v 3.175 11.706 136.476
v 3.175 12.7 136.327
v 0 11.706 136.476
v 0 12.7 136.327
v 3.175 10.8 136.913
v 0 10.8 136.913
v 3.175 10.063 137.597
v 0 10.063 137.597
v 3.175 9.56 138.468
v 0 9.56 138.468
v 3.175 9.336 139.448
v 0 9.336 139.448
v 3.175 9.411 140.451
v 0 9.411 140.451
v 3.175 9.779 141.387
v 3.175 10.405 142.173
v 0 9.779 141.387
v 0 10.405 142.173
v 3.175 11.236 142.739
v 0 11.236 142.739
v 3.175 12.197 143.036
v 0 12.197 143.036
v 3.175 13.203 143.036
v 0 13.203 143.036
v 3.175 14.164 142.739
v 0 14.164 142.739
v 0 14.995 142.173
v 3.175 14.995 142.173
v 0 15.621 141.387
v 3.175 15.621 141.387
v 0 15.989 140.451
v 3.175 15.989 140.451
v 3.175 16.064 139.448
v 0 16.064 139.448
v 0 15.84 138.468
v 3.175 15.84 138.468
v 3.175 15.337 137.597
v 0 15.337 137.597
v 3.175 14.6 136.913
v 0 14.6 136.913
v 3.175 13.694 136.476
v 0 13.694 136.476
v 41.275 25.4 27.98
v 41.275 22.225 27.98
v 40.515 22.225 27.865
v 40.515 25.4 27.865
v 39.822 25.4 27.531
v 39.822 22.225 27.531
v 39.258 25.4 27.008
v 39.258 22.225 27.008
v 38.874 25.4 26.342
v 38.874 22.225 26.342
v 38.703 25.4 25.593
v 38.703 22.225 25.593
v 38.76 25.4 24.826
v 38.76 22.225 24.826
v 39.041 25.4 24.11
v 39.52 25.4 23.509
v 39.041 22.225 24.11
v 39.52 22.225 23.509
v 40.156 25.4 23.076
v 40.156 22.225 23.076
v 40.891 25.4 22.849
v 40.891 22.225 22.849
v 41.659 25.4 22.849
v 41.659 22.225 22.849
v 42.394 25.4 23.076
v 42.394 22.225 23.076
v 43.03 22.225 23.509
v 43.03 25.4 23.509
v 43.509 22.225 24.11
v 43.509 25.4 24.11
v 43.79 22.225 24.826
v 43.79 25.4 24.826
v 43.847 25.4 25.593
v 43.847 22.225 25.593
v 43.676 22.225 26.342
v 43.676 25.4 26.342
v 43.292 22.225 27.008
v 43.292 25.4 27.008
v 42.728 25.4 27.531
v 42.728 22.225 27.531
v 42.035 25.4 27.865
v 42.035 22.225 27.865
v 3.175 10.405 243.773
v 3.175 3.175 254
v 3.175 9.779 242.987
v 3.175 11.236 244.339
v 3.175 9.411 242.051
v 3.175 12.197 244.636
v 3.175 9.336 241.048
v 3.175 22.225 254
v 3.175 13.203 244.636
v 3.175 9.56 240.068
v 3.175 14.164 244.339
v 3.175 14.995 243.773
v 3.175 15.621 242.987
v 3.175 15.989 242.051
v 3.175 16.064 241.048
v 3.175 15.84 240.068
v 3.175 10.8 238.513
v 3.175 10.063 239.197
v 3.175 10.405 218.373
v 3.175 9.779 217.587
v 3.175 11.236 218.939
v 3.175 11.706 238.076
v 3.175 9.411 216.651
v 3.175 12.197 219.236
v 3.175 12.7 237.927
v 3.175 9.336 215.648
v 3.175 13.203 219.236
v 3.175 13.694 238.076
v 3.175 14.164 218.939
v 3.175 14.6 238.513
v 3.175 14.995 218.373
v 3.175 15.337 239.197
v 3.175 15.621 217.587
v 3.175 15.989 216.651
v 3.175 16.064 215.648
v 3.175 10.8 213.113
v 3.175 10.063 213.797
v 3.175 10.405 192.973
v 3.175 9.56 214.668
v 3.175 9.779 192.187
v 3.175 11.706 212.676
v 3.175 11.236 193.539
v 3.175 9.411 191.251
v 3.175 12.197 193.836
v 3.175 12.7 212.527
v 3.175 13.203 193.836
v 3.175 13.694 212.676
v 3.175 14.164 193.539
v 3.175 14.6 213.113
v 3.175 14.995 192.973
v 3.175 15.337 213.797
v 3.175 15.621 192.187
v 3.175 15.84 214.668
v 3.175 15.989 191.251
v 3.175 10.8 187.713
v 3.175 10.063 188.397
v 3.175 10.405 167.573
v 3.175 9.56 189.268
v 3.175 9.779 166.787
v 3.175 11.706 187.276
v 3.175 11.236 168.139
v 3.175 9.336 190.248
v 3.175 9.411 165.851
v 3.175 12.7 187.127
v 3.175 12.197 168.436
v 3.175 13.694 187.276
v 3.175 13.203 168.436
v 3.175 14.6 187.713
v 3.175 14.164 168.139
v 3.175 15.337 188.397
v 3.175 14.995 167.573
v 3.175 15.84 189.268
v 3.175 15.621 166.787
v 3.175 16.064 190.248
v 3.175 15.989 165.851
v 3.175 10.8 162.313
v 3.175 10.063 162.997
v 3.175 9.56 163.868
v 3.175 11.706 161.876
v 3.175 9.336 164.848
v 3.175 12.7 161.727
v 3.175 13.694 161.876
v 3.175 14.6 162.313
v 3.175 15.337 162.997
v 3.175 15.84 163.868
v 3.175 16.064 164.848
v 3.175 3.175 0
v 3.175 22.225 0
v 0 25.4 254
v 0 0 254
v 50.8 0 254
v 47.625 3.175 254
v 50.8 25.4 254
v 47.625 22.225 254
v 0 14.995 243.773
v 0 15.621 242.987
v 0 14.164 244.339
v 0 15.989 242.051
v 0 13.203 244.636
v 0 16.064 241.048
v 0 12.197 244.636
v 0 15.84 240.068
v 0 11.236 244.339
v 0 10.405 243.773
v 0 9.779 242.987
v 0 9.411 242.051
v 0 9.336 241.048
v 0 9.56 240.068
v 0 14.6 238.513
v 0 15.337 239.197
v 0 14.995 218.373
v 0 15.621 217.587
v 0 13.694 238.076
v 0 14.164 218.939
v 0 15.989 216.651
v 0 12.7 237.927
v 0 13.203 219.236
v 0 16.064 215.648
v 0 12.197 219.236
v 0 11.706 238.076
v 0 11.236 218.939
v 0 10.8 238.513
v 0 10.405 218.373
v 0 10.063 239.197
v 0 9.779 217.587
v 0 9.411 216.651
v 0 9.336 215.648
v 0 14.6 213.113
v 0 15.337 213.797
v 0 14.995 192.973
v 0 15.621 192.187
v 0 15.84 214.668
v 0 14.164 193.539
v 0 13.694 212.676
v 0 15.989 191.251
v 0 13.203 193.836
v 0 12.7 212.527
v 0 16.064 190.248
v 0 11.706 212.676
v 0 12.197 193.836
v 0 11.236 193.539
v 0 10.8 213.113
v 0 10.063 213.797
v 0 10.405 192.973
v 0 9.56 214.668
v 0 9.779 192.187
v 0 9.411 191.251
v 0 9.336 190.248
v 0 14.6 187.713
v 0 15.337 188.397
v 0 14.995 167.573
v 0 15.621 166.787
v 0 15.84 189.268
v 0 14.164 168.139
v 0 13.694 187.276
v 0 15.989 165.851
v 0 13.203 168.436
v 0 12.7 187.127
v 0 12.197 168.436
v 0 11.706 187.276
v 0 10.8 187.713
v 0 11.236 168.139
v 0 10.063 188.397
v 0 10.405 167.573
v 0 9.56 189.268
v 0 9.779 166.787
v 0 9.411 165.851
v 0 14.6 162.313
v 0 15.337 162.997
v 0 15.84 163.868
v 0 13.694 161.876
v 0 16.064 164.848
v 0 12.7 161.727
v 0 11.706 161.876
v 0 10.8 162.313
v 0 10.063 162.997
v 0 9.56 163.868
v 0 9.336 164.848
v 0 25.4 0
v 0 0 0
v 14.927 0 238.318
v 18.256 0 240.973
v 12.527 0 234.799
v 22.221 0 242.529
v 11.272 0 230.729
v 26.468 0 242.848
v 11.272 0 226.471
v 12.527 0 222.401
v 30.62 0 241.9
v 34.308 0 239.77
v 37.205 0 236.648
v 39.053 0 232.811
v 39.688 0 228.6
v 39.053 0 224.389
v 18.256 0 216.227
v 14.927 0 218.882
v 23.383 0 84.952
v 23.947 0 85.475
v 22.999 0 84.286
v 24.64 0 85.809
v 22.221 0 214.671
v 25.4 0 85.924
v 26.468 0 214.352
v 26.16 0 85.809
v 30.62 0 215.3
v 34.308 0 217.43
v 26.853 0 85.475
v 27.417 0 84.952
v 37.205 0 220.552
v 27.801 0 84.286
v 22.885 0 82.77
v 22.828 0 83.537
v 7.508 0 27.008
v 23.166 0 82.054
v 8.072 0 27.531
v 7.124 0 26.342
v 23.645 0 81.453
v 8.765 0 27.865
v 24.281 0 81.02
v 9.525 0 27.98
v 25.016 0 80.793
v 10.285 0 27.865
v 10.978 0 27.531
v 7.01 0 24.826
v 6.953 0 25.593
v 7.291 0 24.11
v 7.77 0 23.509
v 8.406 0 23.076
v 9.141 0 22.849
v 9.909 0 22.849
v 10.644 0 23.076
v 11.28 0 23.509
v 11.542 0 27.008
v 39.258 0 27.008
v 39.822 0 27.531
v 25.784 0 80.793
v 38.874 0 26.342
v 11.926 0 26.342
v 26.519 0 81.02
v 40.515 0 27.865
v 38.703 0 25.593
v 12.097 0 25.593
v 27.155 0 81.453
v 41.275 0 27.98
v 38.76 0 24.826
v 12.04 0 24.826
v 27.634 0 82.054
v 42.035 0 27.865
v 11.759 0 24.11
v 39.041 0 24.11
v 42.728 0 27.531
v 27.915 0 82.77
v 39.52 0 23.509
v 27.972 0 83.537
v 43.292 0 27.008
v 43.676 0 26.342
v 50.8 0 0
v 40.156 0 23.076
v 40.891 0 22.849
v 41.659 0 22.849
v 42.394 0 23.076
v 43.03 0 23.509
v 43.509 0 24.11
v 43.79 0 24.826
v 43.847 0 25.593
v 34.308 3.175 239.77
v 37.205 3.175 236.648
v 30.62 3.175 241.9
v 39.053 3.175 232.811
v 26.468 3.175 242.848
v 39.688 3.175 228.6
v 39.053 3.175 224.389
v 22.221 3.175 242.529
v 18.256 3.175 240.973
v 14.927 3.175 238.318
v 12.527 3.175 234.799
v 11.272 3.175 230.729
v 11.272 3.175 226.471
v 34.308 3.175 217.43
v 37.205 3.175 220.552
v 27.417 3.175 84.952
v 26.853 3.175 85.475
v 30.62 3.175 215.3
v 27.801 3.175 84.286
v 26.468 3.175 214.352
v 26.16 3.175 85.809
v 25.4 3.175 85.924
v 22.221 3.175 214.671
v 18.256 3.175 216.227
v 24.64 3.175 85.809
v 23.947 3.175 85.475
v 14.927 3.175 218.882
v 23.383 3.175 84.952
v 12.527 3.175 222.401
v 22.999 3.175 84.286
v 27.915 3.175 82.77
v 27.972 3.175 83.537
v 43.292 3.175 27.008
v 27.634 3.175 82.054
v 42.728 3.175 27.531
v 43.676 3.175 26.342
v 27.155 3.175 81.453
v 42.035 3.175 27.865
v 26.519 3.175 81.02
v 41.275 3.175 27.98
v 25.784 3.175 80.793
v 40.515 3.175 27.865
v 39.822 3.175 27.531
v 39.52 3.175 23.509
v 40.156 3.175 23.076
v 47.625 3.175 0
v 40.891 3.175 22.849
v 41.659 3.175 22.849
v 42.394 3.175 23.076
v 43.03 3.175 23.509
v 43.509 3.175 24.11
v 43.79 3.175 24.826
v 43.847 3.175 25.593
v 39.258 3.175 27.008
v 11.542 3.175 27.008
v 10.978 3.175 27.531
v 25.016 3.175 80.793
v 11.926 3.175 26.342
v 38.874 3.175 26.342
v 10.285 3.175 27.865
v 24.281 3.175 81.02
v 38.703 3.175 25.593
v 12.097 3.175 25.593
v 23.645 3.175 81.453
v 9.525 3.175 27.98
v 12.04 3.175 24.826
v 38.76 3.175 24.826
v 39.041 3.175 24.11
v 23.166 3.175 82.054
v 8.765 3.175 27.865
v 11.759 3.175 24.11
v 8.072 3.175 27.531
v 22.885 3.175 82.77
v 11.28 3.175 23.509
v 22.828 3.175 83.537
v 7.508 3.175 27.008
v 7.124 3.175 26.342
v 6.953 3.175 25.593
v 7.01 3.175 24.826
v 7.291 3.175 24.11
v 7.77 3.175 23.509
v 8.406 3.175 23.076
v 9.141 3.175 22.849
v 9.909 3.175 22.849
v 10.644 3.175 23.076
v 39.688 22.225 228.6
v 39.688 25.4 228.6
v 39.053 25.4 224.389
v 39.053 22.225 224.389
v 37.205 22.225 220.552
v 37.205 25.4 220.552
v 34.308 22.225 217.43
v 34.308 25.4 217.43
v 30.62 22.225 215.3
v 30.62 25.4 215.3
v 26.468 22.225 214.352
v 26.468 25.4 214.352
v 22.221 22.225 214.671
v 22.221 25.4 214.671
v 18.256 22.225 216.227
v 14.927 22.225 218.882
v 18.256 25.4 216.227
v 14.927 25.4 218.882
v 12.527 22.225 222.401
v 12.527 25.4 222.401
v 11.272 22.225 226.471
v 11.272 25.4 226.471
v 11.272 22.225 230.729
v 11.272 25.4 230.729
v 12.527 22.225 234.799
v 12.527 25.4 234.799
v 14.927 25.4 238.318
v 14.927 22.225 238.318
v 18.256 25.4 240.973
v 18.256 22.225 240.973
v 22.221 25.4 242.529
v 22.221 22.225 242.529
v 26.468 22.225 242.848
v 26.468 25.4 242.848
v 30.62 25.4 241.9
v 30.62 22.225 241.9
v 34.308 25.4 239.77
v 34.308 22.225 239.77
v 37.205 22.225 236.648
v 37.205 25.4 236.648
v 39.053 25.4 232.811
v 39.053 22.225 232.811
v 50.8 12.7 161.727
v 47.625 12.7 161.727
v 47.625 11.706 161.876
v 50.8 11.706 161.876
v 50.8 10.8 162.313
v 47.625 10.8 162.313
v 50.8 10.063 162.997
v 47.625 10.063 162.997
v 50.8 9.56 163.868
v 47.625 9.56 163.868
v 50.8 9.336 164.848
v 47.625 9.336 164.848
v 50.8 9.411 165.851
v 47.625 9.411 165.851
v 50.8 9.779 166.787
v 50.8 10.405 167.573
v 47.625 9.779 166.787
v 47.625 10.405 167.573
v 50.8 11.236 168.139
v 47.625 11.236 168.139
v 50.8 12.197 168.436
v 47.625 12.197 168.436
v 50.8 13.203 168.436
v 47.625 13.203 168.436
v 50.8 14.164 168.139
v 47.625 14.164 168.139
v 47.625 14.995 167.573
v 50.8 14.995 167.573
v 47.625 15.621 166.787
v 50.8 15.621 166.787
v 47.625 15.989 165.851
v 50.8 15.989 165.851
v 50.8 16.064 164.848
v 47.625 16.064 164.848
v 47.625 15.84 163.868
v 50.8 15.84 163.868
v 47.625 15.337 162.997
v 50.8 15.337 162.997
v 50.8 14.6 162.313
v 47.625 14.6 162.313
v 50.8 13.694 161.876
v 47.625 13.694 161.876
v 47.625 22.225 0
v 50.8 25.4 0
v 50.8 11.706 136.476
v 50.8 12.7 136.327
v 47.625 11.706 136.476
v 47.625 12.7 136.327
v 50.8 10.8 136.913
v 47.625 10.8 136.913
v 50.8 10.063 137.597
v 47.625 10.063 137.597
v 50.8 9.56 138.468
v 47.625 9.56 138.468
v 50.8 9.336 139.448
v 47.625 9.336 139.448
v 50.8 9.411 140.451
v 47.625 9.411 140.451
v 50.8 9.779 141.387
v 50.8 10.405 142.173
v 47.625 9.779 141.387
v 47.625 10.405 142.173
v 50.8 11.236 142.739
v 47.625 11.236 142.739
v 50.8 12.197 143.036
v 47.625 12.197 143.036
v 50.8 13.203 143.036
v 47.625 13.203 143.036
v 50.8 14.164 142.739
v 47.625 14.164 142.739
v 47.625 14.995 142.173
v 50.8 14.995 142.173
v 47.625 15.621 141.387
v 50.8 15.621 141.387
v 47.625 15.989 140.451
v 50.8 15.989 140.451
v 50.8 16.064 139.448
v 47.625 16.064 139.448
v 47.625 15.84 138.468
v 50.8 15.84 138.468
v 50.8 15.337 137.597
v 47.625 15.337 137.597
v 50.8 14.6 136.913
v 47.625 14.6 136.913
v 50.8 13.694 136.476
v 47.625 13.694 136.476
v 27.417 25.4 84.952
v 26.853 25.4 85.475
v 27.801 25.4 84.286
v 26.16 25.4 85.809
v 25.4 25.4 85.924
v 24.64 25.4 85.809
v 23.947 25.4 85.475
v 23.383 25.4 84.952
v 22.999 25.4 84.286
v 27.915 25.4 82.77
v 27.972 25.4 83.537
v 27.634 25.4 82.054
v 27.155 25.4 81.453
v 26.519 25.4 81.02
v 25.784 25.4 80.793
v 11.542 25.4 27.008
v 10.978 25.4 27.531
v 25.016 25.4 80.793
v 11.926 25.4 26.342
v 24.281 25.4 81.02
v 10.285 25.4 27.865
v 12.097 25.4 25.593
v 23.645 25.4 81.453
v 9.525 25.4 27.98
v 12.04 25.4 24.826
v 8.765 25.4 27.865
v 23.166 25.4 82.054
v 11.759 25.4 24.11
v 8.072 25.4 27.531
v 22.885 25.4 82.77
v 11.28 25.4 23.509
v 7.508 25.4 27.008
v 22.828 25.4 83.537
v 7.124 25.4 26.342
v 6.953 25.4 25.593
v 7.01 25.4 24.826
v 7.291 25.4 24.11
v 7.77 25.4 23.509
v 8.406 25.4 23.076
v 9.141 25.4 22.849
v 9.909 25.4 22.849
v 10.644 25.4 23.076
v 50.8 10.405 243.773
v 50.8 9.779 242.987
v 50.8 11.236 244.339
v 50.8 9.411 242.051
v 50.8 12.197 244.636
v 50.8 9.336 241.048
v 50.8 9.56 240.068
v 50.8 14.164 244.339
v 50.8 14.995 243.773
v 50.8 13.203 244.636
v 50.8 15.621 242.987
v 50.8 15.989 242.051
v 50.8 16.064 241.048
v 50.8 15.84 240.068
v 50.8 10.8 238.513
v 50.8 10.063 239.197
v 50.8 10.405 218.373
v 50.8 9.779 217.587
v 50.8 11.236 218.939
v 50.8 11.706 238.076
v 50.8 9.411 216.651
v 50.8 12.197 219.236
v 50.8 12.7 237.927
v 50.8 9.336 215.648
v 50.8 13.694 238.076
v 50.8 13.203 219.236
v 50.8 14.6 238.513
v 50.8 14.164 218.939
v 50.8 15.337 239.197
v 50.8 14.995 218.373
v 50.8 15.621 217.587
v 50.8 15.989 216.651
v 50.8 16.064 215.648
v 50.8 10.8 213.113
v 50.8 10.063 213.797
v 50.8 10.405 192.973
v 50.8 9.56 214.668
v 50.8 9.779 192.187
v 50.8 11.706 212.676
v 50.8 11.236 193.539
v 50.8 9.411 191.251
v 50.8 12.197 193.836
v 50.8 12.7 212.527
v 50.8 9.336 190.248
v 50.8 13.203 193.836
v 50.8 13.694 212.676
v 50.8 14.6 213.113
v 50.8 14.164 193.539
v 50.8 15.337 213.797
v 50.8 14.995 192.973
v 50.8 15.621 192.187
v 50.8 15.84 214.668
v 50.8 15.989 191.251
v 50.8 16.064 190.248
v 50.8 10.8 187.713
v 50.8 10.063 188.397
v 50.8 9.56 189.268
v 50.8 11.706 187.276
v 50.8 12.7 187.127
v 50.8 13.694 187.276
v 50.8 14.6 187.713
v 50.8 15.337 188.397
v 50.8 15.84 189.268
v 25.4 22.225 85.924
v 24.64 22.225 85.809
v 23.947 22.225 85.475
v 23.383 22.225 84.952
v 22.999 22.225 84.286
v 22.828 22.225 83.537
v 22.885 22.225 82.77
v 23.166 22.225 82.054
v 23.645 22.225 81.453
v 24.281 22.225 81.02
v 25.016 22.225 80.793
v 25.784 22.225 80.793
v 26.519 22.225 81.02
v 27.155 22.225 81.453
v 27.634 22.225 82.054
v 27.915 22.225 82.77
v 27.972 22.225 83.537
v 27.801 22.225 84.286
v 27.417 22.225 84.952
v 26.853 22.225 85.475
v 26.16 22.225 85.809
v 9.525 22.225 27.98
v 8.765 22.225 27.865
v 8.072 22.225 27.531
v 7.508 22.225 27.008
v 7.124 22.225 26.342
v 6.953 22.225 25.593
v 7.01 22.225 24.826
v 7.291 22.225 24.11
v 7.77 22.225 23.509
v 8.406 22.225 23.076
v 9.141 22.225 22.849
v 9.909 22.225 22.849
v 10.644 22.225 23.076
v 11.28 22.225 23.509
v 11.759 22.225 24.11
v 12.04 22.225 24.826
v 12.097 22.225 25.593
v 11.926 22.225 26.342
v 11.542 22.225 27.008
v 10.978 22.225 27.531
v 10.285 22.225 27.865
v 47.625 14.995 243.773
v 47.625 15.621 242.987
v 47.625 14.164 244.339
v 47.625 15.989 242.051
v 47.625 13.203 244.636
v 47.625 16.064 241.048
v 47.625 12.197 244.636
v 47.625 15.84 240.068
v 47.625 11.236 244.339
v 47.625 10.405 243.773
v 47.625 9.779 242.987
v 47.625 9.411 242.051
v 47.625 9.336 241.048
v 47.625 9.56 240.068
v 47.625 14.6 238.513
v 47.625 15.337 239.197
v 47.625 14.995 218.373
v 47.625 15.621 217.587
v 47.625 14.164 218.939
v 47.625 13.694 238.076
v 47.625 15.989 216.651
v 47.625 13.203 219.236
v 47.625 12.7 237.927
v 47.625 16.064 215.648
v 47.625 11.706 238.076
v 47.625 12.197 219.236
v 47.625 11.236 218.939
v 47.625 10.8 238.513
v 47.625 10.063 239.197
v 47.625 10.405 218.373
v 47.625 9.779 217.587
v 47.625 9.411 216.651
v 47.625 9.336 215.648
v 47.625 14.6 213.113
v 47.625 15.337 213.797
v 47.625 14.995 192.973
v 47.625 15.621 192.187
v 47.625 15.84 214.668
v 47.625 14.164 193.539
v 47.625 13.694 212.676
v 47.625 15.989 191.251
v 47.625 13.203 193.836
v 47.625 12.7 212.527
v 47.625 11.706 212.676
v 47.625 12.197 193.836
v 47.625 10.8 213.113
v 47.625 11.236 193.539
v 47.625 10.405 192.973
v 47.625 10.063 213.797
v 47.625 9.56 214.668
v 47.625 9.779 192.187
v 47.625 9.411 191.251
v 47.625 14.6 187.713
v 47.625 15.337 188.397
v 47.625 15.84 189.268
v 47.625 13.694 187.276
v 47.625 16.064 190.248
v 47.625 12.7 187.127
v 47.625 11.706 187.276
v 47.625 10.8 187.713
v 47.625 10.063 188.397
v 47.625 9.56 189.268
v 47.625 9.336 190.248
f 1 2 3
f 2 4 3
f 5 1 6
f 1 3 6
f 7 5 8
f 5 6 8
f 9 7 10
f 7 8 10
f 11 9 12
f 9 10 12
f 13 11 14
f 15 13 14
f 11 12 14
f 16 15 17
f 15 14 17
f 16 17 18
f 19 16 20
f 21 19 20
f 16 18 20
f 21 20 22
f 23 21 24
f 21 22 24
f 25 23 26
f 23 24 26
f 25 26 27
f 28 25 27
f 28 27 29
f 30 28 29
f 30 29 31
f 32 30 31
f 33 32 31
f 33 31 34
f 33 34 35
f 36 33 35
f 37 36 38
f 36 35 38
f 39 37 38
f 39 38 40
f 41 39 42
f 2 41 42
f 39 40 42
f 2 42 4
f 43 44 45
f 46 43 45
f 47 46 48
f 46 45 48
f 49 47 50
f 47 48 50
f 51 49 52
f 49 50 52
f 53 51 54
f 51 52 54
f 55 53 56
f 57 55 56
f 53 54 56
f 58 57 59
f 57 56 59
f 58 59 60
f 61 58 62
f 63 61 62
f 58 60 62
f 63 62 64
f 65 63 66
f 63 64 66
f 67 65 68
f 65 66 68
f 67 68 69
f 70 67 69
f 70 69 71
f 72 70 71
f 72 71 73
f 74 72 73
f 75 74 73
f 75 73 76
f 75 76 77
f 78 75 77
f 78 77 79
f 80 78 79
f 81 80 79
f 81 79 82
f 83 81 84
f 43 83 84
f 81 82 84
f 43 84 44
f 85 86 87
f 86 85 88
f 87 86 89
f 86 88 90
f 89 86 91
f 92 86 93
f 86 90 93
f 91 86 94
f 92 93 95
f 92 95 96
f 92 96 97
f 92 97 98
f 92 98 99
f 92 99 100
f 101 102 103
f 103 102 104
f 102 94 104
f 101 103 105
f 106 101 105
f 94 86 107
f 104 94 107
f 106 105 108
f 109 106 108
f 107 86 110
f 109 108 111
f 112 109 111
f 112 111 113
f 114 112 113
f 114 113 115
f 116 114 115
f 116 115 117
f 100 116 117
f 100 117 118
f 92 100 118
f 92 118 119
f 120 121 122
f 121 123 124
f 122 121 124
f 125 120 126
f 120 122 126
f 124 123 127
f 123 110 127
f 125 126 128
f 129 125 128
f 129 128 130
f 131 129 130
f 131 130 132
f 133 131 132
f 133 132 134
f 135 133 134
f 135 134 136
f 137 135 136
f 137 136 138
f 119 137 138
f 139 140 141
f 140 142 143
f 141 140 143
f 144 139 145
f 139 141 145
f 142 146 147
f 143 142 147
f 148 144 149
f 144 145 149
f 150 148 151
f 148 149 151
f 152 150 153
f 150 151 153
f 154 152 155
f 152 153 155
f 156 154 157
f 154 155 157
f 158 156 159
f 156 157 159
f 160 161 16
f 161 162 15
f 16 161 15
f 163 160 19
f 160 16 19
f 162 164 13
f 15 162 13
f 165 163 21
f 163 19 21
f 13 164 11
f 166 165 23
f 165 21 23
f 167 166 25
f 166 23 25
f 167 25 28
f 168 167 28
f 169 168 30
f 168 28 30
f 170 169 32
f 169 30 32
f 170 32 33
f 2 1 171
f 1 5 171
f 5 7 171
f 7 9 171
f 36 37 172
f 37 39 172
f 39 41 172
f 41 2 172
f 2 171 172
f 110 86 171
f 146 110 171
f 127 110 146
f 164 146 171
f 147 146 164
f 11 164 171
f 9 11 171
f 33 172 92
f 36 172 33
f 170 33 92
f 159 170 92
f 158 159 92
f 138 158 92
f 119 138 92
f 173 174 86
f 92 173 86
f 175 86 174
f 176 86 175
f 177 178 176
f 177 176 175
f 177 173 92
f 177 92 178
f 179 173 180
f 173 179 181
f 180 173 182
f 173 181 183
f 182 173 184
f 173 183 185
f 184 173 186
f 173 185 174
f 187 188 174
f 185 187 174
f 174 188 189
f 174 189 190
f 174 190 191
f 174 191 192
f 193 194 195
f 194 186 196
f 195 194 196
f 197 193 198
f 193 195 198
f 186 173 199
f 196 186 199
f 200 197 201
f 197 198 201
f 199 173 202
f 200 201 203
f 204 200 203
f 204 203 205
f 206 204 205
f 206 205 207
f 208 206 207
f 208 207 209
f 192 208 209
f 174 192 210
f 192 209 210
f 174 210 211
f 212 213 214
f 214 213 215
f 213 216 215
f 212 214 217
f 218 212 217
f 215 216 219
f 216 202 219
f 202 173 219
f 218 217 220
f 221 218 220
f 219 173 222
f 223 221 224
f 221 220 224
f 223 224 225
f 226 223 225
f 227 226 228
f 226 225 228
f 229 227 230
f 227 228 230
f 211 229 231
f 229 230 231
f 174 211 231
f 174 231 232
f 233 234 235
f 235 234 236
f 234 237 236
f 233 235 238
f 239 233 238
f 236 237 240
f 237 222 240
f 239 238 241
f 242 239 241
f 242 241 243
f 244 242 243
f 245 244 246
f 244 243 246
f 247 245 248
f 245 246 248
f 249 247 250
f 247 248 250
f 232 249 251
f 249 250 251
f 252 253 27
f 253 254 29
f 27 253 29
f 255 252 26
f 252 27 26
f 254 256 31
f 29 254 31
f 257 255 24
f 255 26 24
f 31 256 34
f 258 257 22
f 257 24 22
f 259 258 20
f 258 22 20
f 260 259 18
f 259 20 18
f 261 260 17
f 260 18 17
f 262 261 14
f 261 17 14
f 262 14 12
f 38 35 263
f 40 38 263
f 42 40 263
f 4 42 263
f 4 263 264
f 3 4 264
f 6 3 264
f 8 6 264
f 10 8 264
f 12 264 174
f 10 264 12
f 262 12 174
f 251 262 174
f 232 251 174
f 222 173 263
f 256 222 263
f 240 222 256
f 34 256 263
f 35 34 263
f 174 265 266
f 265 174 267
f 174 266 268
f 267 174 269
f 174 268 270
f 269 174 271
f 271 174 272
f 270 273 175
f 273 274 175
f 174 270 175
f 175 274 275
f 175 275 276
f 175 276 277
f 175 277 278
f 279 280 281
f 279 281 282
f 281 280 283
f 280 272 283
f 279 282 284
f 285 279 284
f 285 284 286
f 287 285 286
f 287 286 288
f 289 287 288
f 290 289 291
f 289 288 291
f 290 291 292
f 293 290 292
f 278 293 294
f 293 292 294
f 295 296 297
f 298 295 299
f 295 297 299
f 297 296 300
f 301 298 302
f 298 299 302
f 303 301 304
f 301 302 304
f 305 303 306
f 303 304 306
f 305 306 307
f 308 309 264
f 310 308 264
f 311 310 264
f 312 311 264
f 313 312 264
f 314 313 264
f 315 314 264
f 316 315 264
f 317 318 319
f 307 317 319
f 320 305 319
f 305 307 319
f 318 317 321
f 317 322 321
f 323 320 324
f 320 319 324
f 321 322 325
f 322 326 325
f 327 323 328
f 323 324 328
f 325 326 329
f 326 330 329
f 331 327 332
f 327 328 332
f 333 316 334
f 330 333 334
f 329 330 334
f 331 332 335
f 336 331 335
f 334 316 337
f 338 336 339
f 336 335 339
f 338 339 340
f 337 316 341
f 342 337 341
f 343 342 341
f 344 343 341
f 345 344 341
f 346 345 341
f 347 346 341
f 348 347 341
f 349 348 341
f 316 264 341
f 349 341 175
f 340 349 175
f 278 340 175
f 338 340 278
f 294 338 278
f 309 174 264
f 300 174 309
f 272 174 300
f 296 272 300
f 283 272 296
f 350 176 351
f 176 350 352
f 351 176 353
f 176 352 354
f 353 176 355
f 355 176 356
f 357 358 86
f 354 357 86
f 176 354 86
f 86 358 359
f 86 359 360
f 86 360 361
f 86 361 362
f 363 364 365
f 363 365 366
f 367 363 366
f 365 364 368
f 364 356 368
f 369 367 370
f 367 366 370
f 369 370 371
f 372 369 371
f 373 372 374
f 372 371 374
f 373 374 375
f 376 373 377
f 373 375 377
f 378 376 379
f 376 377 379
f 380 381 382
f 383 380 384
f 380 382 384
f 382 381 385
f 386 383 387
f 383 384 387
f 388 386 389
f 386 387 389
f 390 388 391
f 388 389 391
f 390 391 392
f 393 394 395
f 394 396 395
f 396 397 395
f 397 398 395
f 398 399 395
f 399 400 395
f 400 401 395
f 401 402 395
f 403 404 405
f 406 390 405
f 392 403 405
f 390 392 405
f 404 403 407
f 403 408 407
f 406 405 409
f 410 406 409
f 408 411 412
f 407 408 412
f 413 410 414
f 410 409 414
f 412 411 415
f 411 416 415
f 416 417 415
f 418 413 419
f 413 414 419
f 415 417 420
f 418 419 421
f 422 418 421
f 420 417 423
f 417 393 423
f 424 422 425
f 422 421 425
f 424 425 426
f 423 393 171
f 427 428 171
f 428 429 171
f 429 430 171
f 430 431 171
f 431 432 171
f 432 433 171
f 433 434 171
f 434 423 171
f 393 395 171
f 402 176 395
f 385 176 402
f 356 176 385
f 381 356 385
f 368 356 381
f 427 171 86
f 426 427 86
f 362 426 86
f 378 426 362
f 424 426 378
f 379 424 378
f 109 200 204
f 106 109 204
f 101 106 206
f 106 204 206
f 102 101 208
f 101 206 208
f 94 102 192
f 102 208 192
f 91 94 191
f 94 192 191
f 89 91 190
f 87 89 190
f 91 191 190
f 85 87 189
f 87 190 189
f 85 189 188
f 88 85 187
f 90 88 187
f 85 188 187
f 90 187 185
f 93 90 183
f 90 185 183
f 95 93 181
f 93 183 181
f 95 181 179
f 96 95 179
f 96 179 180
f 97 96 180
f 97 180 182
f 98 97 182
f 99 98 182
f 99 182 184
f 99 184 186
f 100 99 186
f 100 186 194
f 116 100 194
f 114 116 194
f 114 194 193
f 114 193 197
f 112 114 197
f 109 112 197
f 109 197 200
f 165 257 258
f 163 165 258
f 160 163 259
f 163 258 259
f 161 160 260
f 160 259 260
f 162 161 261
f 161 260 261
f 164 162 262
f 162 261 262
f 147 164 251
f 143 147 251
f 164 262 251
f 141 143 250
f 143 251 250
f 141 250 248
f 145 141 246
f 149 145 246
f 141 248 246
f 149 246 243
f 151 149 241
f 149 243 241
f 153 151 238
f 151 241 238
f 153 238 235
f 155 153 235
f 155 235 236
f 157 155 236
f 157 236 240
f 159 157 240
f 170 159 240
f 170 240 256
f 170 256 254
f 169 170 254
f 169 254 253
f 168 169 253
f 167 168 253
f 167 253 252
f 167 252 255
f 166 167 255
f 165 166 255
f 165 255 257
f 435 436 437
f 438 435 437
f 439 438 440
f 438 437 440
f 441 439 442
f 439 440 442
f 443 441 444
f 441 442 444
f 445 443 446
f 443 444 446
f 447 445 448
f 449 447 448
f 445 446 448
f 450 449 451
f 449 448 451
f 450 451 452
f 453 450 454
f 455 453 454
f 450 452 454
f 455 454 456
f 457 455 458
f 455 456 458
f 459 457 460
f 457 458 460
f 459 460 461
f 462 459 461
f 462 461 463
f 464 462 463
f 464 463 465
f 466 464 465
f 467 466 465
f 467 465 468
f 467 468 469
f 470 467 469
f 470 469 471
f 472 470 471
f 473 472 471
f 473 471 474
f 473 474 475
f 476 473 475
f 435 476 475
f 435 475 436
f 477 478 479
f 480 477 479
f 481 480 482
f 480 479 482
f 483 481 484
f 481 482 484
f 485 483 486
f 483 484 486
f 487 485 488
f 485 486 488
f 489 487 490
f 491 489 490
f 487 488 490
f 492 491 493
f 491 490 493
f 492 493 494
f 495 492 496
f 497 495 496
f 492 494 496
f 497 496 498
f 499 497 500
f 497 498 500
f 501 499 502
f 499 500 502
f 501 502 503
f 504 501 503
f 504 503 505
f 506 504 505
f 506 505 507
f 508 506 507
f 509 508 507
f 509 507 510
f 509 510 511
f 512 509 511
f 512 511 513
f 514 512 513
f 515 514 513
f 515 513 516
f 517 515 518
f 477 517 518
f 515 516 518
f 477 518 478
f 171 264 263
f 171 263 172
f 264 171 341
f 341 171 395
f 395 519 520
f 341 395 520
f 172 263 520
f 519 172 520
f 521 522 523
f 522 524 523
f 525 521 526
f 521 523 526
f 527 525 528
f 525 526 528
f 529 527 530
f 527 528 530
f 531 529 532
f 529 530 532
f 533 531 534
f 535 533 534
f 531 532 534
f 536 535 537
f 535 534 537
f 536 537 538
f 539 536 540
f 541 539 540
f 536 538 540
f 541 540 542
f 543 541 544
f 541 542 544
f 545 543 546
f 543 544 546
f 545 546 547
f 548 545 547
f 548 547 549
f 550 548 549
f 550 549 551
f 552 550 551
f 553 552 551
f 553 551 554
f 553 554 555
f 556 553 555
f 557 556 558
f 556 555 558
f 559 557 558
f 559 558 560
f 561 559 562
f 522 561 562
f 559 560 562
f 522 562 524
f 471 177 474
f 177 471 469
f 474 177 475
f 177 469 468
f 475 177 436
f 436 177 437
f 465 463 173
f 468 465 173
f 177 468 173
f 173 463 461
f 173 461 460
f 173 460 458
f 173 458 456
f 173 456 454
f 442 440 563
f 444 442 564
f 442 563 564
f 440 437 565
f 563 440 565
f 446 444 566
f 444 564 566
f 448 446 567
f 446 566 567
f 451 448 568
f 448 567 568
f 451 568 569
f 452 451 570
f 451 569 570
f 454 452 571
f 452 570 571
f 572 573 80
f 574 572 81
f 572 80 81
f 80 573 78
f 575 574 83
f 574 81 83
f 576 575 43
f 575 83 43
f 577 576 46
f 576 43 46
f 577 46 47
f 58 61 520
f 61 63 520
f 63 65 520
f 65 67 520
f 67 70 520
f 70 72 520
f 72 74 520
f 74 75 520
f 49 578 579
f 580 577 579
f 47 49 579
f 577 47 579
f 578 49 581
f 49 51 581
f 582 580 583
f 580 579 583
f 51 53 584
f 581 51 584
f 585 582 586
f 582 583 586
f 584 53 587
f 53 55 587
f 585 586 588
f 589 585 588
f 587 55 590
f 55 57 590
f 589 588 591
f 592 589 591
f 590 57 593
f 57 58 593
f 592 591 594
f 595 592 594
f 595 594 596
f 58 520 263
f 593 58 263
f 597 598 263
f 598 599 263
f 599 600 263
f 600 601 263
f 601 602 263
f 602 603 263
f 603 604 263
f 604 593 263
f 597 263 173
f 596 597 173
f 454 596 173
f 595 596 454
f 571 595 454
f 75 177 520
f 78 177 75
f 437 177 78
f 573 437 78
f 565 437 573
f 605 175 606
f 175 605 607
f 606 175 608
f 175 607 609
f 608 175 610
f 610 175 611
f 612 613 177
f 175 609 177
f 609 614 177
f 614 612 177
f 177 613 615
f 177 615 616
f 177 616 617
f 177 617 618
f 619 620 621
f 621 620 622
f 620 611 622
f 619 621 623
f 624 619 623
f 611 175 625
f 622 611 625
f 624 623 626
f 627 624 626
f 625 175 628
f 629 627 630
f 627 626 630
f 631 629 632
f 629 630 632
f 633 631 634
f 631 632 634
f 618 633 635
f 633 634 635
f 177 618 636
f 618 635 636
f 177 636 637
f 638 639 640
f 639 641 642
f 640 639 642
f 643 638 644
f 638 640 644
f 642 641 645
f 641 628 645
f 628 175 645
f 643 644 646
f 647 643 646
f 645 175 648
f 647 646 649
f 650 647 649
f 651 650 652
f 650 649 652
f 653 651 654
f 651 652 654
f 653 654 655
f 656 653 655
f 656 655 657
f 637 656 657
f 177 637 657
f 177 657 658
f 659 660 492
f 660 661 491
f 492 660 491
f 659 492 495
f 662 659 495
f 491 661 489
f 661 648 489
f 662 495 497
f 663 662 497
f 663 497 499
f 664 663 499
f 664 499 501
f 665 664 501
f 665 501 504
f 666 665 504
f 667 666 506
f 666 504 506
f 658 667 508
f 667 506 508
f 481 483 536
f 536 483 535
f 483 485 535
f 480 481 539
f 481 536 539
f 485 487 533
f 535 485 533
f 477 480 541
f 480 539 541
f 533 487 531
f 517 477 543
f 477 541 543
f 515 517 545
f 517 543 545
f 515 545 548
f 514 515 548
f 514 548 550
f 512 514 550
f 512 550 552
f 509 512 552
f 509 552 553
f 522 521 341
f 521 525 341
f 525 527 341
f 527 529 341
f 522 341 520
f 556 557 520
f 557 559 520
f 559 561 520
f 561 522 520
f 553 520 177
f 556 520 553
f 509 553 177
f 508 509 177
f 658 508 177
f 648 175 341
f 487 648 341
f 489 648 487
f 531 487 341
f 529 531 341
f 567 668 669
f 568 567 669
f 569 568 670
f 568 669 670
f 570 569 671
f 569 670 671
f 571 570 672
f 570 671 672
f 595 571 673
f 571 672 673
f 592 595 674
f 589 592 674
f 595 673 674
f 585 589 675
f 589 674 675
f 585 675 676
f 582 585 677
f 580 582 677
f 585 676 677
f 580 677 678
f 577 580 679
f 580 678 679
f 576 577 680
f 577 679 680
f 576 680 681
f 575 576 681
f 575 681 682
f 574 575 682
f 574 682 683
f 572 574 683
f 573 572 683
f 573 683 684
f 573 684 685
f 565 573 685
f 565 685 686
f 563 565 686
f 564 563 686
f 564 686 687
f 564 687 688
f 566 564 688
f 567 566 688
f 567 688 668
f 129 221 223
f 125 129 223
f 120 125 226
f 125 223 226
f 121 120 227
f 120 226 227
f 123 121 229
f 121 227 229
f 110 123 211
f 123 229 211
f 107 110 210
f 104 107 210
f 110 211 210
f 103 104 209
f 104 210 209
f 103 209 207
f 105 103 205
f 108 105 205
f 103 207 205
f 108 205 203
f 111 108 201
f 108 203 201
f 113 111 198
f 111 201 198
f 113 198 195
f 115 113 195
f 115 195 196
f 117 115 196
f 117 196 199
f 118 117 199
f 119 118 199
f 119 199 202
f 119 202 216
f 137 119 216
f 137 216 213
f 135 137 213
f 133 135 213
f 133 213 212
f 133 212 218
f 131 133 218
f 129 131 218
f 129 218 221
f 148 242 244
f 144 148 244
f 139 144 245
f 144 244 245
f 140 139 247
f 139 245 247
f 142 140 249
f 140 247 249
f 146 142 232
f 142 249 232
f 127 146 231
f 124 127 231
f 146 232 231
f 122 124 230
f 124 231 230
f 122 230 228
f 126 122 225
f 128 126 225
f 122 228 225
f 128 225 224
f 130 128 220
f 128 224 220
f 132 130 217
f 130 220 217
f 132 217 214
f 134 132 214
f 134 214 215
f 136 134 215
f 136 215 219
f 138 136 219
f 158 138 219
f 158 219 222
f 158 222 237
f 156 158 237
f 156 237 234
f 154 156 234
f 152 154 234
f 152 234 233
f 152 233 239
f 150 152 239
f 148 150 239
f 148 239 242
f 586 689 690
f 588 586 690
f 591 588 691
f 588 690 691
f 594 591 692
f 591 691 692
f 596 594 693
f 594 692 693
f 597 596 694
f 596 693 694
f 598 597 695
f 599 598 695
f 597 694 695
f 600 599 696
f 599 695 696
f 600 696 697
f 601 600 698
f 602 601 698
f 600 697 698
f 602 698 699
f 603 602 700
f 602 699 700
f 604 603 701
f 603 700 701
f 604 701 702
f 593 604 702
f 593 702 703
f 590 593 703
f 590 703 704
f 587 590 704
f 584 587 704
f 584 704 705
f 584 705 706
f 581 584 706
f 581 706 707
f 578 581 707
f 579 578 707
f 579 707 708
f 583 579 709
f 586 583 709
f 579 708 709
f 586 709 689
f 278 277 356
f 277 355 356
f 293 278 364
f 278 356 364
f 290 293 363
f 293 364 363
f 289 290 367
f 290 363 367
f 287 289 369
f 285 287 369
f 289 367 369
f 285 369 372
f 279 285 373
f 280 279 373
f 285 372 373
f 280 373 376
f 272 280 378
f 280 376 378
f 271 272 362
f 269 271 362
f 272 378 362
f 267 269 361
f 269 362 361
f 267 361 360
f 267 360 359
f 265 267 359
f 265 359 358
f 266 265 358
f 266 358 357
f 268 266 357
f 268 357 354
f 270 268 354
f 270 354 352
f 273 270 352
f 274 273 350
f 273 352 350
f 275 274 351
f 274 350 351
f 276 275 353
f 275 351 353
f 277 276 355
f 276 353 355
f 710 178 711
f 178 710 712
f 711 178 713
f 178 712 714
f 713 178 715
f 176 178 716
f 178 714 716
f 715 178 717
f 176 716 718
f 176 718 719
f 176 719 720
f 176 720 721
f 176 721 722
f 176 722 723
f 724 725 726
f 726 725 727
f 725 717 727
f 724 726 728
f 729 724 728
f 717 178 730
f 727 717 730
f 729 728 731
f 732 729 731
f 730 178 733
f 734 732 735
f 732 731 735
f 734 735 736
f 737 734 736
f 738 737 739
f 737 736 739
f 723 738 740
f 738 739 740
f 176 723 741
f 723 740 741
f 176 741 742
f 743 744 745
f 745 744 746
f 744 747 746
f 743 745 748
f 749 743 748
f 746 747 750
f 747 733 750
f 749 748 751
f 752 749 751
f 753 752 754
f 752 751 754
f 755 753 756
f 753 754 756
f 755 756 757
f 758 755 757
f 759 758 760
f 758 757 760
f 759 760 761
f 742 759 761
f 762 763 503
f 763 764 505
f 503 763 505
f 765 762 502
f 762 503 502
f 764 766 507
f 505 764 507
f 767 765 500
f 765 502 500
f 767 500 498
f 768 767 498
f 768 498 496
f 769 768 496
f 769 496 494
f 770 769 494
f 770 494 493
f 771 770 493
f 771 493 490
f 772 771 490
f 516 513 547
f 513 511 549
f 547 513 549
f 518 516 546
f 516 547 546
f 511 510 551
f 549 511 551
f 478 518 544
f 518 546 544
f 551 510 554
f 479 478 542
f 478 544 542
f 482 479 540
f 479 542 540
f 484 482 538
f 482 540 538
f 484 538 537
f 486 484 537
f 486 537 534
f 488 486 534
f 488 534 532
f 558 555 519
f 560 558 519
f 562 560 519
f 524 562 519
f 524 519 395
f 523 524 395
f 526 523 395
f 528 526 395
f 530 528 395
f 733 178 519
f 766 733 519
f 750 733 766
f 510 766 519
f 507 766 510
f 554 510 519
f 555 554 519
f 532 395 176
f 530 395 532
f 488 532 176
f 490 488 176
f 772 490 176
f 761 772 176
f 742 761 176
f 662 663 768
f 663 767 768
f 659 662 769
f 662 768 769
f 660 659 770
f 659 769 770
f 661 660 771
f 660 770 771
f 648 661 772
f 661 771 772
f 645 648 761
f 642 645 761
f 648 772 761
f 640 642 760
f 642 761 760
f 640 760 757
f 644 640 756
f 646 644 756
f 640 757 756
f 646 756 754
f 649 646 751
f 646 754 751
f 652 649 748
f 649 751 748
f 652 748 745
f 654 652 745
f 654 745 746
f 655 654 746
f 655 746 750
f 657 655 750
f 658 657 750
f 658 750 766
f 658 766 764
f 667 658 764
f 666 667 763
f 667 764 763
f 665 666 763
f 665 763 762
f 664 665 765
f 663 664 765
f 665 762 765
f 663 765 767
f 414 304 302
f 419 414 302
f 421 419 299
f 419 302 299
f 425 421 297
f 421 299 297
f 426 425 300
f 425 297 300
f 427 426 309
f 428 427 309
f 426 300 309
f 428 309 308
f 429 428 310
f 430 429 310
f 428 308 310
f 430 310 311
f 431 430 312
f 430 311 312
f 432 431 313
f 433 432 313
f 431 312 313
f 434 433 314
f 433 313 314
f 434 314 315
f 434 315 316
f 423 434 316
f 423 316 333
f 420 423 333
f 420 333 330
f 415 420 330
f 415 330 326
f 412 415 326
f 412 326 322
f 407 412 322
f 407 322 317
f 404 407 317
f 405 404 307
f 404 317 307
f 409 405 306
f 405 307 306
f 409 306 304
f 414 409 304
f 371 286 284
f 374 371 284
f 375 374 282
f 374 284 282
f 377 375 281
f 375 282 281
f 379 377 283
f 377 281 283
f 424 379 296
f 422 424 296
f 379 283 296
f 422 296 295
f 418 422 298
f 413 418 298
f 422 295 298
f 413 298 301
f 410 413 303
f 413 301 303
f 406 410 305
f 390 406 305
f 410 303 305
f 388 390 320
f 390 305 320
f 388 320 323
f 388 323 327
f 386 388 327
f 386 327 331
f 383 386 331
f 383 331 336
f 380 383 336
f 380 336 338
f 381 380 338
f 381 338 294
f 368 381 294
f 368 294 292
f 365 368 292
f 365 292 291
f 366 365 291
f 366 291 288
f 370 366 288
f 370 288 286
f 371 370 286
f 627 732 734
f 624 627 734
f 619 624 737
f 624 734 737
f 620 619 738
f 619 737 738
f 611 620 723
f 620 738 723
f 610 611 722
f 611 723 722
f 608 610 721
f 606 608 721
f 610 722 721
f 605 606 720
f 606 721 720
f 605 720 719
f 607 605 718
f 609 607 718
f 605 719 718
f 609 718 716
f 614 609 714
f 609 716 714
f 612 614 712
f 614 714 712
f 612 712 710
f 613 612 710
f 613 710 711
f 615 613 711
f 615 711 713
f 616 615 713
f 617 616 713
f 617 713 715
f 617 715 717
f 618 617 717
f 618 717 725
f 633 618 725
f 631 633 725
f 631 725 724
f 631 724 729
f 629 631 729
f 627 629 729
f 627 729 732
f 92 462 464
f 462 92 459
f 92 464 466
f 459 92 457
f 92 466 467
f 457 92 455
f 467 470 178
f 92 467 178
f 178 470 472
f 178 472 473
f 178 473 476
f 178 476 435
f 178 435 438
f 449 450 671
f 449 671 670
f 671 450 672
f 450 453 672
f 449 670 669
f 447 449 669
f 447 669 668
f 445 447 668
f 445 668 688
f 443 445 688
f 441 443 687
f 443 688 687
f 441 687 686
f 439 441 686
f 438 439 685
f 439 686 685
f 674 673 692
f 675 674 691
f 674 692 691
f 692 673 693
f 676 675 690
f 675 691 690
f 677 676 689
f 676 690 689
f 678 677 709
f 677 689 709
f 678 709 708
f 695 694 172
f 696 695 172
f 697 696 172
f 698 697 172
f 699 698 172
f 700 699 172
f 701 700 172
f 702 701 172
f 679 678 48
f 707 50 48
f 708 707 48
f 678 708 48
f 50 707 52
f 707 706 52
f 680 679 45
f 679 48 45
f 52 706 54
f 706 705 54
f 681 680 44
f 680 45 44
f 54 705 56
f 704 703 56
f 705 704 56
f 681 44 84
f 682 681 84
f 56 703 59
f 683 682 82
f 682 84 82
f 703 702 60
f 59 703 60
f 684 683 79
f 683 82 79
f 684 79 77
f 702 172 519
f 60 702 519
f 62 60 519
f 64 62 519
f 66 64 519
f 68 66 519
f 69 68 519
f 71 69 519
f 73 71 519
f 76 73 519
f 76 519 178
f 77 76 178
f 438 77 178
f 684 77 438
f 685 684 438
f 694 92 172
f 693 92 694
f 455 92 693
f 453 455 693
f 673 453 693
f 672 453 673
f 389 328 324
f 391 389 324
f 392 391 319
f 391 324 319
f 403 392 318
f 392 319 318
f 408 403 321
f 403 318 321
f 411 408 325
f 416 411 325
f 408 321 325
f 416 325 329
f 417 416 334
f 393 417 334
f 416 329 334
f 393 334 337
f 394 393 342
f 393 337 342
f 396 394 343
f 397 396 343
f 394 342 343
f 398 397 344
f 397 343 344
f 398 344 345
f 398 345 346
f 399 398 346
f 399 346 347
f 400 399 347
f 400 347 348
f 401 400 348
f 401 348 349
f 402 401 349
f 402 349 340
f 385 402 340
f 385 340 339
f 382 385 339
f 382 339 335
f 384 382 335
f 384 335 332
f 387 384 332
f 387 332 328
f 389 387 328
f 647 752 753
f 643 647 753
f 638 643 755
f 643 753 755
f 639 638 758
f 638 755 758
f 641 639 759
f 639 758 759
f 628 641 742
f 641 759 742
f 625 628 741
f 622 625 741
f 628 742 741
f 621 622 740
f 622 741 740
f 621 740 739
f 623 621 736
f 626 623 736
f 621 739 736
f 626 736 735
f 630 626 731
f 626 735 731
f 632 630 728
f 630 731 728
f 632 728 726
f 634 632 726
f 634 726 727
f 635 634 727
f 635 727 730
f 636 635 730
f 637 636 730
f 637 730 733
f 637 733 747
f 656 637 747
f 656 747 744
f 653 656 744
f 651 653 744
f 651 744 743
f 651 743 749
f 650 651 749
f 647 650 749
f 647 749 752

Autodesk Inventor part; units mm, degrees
ref_plane "YZ Plane" through (0, 0, 0) normal (1, 0, 0) x (0, 1, 0)
ref_plane "XZ Plane" through (0, 0, 0) normal (0, 1, 0) x (-1, 0, 0)
ref_plane "XY Plane" through (0, 0, 0) normal (0, 0, 1) x (1, 0, 0)
sketch "Sketch1" plane through (0, 0, 0) normal (0, 0, 1) x (1, 0, 0)
  line L0 (0, 0) -> (50.8, 0)
  line L1 (50.8, 0) -> (50.8, 25.4)
  line L2 (50.8, 25.4) -> (0, 25.4)
  line L3 (0, 25.4) -> (0, 0)
  line L4 (3.175, 22.225) -> (47.625, 22.225)
  line L5 (47.625, 22.225) -> (47.625, 3.175)
  line L6 (47.625, 3.175) -> (3.175, 3.175)
  line L7 (3.175, 3.175) -> (3.175, 22.225)
  dimension "d0" = 50.8
  dimension "d1" = 25.4
  dimension "d2" = 3.175
extrude "Extrusion1" add sketch "Sketch1" along normal blind 254
sketch "Sketch2" plane through (0, 0, 0) normal (0, -1, 0) x (1, 0, 0)
  circle A0 centre (25.4, 228.6) radius 4.7625
  line L0 (47.625, 254) -> (3.175, 254) projected
  line L1 (0, 0) -> (0, 254) projected
  dimension "d5" = 9.525
  dimension "d6" = 25.4
  dimension "d7" = 25.4
extrude "Extrusion2" cut sketch "Sketch2" against normal blind 25.4
sketch "Sketch3" plane through (0, 25.4, 0) normal (0, 1, 0) x (1, 0, 0)
  circle A0 centre (25.4, -228.6) radius 4.7625 projected
  circle A1 centre (25.4, -228.6) radius 14.2875
  point P0 (0, 0)
  dimension "d10" = 28.575
extrude "Extrusion3" cut sketch "Sketch3" against normal blind 25.4
ref_plane "Work Plane1" through (25.4, 0, 228.6) normal (0, 0, -1) x (1, 0, 0)
sketch "Sketch5" plane through (50.8, 0, 0) normal (1, 0, 0) x (0, 0, -1)
  line L0 (-254, 0) -> (-254, 25.4) projected
  line L1 (0, 0) -> (-254, 0) projected
  line L2 (0, 25.4) -> (-254, 25.4) projected
  point P0 (-215.9, 12.7)
  point P1 (-190.5, 12.7)
  point P2 (-165.1, 12.7)
  point P3 (-241.3, 12.7)
  point P4 (-139.7, 12.7)
  dimension "d21" = 38.1
  dimension "d22" = 12.7
  dimension "d23" = 25.4
  dimension "d24" = 25.4
  dimension "d25" = 12.7
  dimension "d26" = 12.7
  dimension "d57" = 25.4
  dimension "d58" = 25.4
  dimension "d59" = 12.7
  dimension "d60" = 12.7
hole "Hole1" at (50.8, 12.7, 215.9) at (50.8, 12.7, 190.5) at (50.8, 12.7, 165.1) at (50.8, 12.7, 139.7) at (50.8, 12.7, 241.3) direction (-1, 0, 0) diameter 6.7469 end through all
sketch "Sketch6" plane through (0, 25.4, 0) normal (0, 1, 0) x (1, 0, 0)
  line L0 (50.8, 0) -> (50.8, -254) projected
  line L1 (0, 0) -> (0, -254) projected
  line L2 (50.8, 0) -> (0, 0) projected
  point P0 (25.4, -83.3438)
  point P1 (41.275, -25.4)
  point P2 (9.525, -25.4)
  dimension "d42" = 83.3438
  dimension "d43" = 25.4
  dimension "d53" = 57.9438
  dimension "d54" = 57.9438
  dimension "d55" = 15.875
  dimension "d56" = 31.75
hole "Hole2" at (25.4, 25.4, 83.3438) at (41.275, 25.4, 25.4) at (9.525, 25.4, 25.4) direction (0, -1, 0) diameter 5.1594 end through all
properties part number "15102898-16-A-0201" material "Aluminum 6061"
